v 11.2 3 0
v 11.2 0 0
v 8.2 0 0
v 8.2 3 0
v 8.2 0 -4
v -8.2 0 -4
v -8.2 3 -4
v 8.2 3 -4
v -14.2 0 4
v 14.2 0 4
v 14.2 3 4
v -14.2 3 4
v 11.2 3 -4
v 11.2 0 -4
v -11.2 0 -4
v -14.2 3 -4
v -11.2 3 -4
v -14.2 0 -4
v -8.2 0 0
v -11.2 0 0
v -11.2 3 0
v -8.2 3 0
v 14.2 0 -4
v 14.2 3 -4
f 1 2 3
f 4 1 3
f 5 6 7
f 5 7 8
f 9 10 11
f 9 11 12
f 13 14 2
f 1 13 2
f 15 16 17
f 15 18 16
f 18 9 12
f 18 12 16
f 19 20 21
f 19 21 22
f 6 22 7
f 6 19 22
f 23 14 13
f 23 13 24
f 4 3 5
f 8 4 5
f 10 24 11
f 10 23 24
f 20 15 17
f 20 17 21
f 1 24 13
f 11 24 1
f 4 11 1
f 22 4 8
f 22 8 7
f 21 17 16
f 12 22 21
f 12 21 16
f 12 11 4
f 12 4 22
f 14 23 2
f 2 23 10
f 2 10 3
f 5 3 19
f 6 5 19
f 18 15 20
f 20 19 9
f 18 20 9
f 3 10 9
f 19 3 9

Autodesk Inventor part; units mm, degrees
ref_plane "YZ Plane" through (0, 0, 0) normal (1, 0, 0) x (0, 1, 0)
ref_plane "XZ Plane" through (0, 0, 0) normal (0, 1, 0) x (-1, 0, 0)
ref_plane "XY Plane" through (0, 0, 0) normal (0, 0, 1) x (1, 0, 0)
sketch "草圖1" plane through (0, 0, 0) normal (0, 1, 0) x (-1, 0, 0)
  line L0 (-14.2, 4) -> (14.2, 4)
  line L1 (14.2, 4) -> (14.2, -4)
  line L2 (-14.2, -4) -> (-14.2, 4)
  line L3 (-14.2, 4) -> (14.2, -4) construction
  line L4 (14.2, 4) -> (-14.2, -4) construction
  line L5 (-11.2, -4) -> (-11.2, 0)
  line L6 (-11.2, 0) -> (-8.2, 0)
  line L7 (-8.2, 0) -> (-8.2, -4)
  line L8 (0, 7.3969) -> (0, -7.2649)
  line L9 (11.2, -4) -> (11.2, 0)
  line L10 (11.2, 0) -> (8.2, 0)
  line L11 (8.2, 0) -> (8.2, -4)
  line L12 (14.2, -4) -> (11.2, -4)
  line L13 (8.2, -4) -> (-8.2, -4)
  line L14 (-11.2, -4) -> (-14.2, -4)
  point P0 (0, 0)
  dimension "d0" = 4
  dimension "d1" = 8
  dimension "d2" = 16.4
  dimension "d3" = 3
  dimension "d5" = 28.4
extrude "擠出1" add sketch "草圖1" along normal blind 3
equation "\"d5\" = d2 + 4 * d3"
properties part number "upper support"
